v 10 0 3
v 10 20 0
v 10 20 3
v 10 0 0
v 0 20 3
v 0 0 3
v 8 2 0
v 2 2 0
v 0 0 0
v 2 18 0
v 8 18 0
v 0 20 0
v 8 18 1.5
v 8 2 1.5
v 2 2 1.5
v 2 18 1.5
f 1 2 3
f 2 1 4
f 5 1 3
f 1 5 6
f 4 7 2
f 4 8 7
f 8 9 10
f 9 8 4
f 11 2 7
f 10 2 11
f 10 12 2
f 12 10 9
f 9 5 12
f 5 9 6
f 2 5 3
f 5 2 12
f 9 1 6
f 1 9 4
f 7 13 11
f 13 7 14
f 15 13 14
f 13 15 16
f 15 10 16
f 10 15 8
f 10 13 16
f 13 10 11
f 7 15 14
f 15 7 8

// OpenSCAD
waxbase();

module waxbase(width=10, length=20, height=3, width_walls=2) {

    // Everything in mm

    // width = 10; // mm
    // length = 20; // mm
    // height = 3; // mm

    // width_walls = 2; // mm - thickness of the walls

    // How high the inset should be
    height_inset = height - 1.5;

    difference() {
        // The basic block
        cube([width, length, height]);

        // The inset cube for the wax
        translate([width_walls, width_walls, 0])
            cube([width-2*width_walls, length-2*width_walls, height_inset]);
    }
}
